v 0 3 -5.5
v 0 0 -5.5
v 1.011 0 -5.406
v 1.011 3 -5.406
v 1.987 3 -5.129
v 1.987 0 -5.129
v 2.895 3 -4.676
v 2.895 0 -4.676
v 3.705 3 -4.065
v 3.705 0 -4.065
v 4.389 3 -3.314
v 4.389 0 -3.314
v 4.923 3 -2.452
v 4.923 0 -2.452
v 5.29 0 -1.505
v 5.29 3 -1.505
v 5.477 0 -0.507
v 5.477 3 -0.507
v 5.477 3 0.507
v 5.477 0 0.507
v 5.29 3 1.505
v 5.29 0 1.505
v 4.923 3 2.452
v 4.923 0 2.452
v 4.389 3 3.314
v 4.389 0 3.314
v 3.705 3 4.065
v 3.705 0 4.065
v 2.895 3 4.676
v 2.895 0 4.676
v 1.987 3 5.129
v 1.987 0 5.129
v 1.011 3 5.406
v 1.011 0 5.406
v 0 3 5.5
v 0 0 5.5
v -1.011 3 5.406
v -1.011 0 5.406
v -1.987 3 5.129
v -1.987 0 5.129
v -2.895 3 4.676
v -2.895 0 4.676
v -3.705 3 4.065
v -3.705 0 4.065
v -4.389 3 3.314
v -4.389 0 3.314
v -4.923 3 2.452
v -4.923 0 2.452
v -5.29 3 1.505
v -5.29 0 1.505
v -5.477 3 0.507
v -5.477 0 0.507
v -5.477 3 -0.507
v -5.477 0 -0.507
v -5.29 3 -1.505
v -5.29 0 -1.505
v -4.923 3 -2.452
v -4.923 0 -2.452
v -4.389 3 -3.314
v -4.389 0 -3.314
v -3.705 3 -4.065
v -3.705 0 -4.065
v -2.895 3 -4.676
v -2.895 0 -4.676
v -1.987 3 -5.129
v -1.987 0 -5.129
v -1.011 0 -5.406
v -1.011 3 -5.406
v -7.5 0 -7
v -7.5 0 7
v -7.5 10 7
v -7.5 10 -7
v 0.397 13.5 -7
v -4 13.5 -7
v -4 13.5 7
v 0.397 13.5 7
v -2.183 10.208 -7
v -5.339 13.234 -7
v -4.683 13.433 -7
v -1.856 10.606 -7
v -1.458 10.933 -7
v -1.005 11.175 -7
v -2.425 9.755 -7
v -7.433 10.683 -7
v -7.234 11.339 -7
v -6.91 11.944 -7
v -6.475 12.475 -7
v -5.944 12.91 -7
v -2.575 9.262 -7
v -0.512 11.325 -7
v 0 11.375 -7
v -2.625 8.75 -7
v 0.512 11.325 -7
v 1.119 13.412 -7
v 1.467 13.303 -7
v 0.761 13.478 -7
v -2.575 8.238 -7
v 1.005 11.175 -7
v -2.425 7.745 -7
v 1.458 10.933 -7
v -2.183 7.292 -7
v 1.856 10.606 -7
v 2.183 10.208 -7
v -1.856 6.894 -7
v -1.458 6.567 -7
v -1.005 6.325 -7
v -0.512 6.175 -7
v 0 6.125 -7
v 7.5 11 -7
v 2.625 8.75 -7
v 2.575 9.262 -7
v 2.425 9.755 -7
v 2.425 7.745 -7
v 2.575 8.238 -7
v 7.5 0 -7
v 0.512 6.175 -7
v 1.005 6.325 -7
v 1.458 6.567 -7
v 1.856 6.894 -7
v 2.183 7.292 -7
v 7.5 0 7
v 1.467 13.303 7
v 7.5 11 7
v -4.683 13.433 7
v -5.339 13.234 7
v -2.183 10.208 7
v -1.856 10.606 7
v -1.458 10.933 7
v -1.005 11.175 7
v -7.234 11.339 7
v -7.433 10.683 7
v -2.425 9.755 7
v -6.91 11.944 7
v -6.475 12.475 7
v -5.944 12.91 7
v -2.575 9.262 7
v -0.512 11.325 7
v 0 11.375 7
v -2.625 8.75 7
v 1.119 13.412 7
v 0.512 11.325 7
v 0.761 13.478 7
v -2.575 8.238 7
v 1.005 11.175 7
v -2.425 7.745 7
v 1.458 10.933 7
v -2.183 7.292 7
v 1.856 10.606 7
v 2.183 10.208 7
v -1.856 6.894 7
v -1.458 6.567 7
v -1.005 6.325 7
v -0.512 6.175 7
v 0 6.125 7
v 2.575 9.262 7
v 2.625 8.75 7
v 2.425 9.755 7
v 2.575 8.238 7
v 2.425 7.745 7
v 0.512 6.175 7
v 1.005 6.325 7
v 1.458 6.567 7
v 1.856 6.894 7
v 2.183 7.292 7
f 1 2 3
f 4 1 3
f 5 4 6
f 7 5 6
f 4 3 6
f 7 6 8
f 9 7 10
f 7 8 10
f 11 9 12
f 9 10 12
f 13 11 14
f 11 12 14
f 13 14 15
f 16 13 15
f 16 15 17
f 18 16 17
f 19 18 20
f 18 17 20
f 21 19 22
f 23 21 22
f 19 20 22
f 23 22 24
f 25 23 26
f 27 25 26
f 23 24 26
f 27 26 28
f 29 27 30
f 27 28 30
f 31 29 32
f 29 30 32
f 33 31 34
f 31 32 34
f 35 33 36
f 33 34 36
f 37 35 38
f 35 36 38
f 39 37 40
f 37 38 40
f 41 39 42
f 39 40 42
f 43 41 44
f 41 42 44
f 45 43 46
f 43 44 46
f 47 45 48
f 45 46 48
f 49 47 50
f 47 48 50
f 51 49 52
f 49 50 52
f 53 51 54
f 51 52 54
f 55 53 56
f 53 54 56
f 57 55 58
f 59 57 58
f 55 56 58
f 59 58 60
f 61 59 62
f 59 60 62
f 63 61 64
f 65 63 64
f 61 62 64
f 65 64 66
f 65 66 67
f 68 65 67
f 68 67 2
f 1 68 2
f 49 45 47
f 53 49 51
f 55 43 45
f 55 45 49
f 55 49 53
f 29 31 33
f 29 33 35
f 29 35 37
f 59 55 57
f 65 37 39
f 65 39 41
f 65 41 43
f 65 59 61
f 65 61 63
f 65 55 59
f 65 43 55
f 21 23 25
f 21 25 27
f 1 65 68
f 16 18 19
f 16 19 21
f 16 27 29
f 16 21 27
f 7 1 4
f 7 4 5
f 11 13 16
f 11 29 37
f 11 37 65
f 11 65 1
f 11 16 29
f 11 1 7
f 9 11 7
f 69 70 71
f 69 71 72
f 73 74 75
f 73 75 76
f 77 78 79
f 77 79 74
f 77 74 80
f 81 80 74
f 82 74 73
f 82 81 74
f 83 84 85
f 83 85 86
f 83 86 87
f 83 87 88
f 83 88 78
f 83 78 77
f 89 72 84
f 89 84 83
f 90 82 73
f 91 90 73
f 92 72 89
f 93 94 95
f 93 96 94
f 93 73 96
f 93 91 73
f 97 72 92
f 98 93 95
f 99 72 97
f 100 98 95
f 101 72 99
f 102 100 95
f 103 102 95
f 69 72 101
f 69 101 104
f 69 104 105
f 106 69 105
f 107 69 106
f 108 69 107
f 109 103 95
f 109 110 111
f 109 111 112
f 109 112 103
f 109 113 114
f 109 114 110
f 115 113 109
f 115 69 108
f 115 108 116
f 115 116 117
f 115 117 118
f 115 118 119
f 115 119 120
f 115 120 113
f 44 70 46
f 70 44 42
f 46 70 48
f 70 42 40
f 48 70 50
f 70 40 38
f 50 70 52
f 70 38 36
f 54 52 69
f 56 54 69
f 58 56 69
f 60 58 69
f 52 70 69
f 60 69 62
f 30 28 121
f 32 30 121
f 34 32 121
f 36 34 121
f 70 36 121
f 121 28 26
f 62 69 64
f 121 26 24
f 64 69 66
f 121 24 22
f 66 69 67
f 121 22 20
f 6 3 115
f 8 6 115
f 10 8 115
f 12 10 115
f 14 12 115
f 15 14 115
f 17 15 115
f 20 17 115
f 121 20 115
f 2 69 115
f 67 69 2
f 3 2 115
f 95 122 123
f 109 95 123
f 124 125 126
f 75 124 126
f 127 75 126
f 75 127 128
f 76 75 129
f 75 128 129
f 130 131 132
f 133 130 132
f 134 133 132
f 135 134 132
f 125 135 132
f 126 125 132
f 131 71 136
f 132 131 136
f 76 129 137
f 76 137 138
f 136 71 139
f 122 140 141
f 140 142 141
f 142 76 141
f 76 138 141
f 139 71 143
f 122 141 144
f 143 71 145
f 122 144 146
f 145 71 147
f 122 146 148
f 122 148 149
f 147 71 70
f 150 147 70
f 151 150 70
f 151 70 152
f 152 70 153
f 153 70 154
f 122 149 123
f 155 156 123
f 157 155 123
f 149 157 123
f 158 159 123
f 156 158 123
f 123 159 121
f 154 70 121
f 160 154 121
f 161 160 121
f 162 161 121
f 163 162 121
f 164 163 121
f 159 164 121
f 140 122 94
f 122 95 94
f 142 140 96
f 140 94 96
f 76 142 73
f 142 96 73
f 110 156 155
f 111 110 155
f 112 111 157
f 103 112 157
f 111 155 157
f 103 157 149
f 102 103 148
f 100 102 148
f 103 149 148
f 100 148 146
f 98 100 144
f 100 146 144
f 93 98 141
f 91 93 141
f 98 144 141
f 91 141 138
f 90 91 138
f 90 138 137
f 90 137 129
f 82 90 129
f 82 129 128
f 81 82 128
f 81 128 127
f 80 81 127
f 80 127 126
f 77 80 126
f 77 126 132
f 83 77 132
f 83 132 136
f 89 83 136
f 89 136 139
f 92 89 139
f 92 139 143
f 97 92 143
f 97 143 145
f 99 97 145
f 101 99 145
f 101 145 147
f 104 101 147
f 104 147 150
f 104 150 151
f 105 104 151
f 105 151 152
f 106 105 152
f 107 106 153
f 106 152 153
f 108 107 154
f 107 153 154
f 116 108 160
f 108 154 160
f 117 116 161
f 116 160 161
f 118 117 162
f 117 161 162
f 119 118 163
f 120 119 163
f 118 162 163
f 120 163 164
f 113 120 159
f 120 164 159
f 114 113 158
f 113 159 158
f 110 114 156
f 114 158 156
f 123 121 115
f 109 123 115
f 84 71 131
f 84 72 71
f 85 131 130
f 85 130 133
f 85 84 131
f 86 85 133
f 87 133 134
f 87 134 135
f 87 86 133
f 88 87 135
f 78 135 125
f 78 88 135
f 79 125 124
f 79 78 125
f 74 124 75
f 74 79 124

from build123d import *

# Parameters (mm, degrees)
SZKIC1_W                    = 15
SZKIC1_H                    = 14
DODANIE_WYCI_GNI_CIE1_DEPTH = 13.5
SZKIC2_R                    = 2.625
WYTNIJ_WYCI_GNI_CIE1_DEPTH  = 15
ZAOKR_GLENIE1_R             = 3.5
WYTNIJ_WYCI_GNI_CIE2_DEPTH  = 15
ZAOKR_GLENIE2_R             = 3
SZKIC4_R                    = 5.5
WYTNIJ_WYCI_GNI_CIE3_DEPTH  = 3


with BuildPart() as part:
    # Szkic1 → Dodanie-wyciągnięcie1 (new body)
    with BuildSketch(Plane(origin=(0, 0, 0), x_dir=(1, 0, 0), z_dir=(0, 1, 0))):
        Rectangle(SZKIC1_W, SZKIC1_H)
    extrude(amount=DODANIE_WYCI_GNI_CIE1_DEPTH)

    # Szkic2 → Wytnij-wyciągnięcie1 (cut)
    with BuildSketch(Plane.XY.offset(7)):
        with Locations((0, 8.75)):
            Circle(SZKIC2_R)
    extrude(amount=-WYTNIJ_WYCI_GNI_CIE1_DEPTH, mode=Mode.SUBTRACT)

    # Zaokrąglenie1
    zaokr_glenie1_edges = [part.edges().sort_by_distance(p)[0] for p in [
        (-7.5, 13.5, 0),
    ]]
    fillet(zaokr_glenie1_edges, radius=ZAOKR_GLENIE1_R)

    # Szkic3 → Wytnij-wyciągnięcie2 (cut)
    with BuildSketch(Plane.XY.offset(7)):
        Polygon((0.95, 13.5), (7.5, 11), (7.5, 13.5), align=None)
    extrude(amount=-WYTNIJ_WYCI_GNI_CIE2_DEPTH, mode=Mode.SUBTRACT)

    # Zaokrąglenie2
    zaokr_glenie2_edges = [part.edges().sort_by_distance(p)[0] for p in [
        (0.95, 13.5, 0),
    ]]
    fillet(zaokr_glenie2_edges, radius=ZAOKR_GLENIE2_R)

    # Szkic4 → Wytnij-wyciągnięcie3 (cut)
    with BuildSketch(Plane.XZ):
        with Locations(Location((0, 0, 0), (0, 0, 270))):
            Circle(SZKIC4_R)
    extrude(amount=-WYTNIJ_WYCI_GNI_CIE3_DEPTH, mode=Mode.SUBTRACT)


solid = part.part
